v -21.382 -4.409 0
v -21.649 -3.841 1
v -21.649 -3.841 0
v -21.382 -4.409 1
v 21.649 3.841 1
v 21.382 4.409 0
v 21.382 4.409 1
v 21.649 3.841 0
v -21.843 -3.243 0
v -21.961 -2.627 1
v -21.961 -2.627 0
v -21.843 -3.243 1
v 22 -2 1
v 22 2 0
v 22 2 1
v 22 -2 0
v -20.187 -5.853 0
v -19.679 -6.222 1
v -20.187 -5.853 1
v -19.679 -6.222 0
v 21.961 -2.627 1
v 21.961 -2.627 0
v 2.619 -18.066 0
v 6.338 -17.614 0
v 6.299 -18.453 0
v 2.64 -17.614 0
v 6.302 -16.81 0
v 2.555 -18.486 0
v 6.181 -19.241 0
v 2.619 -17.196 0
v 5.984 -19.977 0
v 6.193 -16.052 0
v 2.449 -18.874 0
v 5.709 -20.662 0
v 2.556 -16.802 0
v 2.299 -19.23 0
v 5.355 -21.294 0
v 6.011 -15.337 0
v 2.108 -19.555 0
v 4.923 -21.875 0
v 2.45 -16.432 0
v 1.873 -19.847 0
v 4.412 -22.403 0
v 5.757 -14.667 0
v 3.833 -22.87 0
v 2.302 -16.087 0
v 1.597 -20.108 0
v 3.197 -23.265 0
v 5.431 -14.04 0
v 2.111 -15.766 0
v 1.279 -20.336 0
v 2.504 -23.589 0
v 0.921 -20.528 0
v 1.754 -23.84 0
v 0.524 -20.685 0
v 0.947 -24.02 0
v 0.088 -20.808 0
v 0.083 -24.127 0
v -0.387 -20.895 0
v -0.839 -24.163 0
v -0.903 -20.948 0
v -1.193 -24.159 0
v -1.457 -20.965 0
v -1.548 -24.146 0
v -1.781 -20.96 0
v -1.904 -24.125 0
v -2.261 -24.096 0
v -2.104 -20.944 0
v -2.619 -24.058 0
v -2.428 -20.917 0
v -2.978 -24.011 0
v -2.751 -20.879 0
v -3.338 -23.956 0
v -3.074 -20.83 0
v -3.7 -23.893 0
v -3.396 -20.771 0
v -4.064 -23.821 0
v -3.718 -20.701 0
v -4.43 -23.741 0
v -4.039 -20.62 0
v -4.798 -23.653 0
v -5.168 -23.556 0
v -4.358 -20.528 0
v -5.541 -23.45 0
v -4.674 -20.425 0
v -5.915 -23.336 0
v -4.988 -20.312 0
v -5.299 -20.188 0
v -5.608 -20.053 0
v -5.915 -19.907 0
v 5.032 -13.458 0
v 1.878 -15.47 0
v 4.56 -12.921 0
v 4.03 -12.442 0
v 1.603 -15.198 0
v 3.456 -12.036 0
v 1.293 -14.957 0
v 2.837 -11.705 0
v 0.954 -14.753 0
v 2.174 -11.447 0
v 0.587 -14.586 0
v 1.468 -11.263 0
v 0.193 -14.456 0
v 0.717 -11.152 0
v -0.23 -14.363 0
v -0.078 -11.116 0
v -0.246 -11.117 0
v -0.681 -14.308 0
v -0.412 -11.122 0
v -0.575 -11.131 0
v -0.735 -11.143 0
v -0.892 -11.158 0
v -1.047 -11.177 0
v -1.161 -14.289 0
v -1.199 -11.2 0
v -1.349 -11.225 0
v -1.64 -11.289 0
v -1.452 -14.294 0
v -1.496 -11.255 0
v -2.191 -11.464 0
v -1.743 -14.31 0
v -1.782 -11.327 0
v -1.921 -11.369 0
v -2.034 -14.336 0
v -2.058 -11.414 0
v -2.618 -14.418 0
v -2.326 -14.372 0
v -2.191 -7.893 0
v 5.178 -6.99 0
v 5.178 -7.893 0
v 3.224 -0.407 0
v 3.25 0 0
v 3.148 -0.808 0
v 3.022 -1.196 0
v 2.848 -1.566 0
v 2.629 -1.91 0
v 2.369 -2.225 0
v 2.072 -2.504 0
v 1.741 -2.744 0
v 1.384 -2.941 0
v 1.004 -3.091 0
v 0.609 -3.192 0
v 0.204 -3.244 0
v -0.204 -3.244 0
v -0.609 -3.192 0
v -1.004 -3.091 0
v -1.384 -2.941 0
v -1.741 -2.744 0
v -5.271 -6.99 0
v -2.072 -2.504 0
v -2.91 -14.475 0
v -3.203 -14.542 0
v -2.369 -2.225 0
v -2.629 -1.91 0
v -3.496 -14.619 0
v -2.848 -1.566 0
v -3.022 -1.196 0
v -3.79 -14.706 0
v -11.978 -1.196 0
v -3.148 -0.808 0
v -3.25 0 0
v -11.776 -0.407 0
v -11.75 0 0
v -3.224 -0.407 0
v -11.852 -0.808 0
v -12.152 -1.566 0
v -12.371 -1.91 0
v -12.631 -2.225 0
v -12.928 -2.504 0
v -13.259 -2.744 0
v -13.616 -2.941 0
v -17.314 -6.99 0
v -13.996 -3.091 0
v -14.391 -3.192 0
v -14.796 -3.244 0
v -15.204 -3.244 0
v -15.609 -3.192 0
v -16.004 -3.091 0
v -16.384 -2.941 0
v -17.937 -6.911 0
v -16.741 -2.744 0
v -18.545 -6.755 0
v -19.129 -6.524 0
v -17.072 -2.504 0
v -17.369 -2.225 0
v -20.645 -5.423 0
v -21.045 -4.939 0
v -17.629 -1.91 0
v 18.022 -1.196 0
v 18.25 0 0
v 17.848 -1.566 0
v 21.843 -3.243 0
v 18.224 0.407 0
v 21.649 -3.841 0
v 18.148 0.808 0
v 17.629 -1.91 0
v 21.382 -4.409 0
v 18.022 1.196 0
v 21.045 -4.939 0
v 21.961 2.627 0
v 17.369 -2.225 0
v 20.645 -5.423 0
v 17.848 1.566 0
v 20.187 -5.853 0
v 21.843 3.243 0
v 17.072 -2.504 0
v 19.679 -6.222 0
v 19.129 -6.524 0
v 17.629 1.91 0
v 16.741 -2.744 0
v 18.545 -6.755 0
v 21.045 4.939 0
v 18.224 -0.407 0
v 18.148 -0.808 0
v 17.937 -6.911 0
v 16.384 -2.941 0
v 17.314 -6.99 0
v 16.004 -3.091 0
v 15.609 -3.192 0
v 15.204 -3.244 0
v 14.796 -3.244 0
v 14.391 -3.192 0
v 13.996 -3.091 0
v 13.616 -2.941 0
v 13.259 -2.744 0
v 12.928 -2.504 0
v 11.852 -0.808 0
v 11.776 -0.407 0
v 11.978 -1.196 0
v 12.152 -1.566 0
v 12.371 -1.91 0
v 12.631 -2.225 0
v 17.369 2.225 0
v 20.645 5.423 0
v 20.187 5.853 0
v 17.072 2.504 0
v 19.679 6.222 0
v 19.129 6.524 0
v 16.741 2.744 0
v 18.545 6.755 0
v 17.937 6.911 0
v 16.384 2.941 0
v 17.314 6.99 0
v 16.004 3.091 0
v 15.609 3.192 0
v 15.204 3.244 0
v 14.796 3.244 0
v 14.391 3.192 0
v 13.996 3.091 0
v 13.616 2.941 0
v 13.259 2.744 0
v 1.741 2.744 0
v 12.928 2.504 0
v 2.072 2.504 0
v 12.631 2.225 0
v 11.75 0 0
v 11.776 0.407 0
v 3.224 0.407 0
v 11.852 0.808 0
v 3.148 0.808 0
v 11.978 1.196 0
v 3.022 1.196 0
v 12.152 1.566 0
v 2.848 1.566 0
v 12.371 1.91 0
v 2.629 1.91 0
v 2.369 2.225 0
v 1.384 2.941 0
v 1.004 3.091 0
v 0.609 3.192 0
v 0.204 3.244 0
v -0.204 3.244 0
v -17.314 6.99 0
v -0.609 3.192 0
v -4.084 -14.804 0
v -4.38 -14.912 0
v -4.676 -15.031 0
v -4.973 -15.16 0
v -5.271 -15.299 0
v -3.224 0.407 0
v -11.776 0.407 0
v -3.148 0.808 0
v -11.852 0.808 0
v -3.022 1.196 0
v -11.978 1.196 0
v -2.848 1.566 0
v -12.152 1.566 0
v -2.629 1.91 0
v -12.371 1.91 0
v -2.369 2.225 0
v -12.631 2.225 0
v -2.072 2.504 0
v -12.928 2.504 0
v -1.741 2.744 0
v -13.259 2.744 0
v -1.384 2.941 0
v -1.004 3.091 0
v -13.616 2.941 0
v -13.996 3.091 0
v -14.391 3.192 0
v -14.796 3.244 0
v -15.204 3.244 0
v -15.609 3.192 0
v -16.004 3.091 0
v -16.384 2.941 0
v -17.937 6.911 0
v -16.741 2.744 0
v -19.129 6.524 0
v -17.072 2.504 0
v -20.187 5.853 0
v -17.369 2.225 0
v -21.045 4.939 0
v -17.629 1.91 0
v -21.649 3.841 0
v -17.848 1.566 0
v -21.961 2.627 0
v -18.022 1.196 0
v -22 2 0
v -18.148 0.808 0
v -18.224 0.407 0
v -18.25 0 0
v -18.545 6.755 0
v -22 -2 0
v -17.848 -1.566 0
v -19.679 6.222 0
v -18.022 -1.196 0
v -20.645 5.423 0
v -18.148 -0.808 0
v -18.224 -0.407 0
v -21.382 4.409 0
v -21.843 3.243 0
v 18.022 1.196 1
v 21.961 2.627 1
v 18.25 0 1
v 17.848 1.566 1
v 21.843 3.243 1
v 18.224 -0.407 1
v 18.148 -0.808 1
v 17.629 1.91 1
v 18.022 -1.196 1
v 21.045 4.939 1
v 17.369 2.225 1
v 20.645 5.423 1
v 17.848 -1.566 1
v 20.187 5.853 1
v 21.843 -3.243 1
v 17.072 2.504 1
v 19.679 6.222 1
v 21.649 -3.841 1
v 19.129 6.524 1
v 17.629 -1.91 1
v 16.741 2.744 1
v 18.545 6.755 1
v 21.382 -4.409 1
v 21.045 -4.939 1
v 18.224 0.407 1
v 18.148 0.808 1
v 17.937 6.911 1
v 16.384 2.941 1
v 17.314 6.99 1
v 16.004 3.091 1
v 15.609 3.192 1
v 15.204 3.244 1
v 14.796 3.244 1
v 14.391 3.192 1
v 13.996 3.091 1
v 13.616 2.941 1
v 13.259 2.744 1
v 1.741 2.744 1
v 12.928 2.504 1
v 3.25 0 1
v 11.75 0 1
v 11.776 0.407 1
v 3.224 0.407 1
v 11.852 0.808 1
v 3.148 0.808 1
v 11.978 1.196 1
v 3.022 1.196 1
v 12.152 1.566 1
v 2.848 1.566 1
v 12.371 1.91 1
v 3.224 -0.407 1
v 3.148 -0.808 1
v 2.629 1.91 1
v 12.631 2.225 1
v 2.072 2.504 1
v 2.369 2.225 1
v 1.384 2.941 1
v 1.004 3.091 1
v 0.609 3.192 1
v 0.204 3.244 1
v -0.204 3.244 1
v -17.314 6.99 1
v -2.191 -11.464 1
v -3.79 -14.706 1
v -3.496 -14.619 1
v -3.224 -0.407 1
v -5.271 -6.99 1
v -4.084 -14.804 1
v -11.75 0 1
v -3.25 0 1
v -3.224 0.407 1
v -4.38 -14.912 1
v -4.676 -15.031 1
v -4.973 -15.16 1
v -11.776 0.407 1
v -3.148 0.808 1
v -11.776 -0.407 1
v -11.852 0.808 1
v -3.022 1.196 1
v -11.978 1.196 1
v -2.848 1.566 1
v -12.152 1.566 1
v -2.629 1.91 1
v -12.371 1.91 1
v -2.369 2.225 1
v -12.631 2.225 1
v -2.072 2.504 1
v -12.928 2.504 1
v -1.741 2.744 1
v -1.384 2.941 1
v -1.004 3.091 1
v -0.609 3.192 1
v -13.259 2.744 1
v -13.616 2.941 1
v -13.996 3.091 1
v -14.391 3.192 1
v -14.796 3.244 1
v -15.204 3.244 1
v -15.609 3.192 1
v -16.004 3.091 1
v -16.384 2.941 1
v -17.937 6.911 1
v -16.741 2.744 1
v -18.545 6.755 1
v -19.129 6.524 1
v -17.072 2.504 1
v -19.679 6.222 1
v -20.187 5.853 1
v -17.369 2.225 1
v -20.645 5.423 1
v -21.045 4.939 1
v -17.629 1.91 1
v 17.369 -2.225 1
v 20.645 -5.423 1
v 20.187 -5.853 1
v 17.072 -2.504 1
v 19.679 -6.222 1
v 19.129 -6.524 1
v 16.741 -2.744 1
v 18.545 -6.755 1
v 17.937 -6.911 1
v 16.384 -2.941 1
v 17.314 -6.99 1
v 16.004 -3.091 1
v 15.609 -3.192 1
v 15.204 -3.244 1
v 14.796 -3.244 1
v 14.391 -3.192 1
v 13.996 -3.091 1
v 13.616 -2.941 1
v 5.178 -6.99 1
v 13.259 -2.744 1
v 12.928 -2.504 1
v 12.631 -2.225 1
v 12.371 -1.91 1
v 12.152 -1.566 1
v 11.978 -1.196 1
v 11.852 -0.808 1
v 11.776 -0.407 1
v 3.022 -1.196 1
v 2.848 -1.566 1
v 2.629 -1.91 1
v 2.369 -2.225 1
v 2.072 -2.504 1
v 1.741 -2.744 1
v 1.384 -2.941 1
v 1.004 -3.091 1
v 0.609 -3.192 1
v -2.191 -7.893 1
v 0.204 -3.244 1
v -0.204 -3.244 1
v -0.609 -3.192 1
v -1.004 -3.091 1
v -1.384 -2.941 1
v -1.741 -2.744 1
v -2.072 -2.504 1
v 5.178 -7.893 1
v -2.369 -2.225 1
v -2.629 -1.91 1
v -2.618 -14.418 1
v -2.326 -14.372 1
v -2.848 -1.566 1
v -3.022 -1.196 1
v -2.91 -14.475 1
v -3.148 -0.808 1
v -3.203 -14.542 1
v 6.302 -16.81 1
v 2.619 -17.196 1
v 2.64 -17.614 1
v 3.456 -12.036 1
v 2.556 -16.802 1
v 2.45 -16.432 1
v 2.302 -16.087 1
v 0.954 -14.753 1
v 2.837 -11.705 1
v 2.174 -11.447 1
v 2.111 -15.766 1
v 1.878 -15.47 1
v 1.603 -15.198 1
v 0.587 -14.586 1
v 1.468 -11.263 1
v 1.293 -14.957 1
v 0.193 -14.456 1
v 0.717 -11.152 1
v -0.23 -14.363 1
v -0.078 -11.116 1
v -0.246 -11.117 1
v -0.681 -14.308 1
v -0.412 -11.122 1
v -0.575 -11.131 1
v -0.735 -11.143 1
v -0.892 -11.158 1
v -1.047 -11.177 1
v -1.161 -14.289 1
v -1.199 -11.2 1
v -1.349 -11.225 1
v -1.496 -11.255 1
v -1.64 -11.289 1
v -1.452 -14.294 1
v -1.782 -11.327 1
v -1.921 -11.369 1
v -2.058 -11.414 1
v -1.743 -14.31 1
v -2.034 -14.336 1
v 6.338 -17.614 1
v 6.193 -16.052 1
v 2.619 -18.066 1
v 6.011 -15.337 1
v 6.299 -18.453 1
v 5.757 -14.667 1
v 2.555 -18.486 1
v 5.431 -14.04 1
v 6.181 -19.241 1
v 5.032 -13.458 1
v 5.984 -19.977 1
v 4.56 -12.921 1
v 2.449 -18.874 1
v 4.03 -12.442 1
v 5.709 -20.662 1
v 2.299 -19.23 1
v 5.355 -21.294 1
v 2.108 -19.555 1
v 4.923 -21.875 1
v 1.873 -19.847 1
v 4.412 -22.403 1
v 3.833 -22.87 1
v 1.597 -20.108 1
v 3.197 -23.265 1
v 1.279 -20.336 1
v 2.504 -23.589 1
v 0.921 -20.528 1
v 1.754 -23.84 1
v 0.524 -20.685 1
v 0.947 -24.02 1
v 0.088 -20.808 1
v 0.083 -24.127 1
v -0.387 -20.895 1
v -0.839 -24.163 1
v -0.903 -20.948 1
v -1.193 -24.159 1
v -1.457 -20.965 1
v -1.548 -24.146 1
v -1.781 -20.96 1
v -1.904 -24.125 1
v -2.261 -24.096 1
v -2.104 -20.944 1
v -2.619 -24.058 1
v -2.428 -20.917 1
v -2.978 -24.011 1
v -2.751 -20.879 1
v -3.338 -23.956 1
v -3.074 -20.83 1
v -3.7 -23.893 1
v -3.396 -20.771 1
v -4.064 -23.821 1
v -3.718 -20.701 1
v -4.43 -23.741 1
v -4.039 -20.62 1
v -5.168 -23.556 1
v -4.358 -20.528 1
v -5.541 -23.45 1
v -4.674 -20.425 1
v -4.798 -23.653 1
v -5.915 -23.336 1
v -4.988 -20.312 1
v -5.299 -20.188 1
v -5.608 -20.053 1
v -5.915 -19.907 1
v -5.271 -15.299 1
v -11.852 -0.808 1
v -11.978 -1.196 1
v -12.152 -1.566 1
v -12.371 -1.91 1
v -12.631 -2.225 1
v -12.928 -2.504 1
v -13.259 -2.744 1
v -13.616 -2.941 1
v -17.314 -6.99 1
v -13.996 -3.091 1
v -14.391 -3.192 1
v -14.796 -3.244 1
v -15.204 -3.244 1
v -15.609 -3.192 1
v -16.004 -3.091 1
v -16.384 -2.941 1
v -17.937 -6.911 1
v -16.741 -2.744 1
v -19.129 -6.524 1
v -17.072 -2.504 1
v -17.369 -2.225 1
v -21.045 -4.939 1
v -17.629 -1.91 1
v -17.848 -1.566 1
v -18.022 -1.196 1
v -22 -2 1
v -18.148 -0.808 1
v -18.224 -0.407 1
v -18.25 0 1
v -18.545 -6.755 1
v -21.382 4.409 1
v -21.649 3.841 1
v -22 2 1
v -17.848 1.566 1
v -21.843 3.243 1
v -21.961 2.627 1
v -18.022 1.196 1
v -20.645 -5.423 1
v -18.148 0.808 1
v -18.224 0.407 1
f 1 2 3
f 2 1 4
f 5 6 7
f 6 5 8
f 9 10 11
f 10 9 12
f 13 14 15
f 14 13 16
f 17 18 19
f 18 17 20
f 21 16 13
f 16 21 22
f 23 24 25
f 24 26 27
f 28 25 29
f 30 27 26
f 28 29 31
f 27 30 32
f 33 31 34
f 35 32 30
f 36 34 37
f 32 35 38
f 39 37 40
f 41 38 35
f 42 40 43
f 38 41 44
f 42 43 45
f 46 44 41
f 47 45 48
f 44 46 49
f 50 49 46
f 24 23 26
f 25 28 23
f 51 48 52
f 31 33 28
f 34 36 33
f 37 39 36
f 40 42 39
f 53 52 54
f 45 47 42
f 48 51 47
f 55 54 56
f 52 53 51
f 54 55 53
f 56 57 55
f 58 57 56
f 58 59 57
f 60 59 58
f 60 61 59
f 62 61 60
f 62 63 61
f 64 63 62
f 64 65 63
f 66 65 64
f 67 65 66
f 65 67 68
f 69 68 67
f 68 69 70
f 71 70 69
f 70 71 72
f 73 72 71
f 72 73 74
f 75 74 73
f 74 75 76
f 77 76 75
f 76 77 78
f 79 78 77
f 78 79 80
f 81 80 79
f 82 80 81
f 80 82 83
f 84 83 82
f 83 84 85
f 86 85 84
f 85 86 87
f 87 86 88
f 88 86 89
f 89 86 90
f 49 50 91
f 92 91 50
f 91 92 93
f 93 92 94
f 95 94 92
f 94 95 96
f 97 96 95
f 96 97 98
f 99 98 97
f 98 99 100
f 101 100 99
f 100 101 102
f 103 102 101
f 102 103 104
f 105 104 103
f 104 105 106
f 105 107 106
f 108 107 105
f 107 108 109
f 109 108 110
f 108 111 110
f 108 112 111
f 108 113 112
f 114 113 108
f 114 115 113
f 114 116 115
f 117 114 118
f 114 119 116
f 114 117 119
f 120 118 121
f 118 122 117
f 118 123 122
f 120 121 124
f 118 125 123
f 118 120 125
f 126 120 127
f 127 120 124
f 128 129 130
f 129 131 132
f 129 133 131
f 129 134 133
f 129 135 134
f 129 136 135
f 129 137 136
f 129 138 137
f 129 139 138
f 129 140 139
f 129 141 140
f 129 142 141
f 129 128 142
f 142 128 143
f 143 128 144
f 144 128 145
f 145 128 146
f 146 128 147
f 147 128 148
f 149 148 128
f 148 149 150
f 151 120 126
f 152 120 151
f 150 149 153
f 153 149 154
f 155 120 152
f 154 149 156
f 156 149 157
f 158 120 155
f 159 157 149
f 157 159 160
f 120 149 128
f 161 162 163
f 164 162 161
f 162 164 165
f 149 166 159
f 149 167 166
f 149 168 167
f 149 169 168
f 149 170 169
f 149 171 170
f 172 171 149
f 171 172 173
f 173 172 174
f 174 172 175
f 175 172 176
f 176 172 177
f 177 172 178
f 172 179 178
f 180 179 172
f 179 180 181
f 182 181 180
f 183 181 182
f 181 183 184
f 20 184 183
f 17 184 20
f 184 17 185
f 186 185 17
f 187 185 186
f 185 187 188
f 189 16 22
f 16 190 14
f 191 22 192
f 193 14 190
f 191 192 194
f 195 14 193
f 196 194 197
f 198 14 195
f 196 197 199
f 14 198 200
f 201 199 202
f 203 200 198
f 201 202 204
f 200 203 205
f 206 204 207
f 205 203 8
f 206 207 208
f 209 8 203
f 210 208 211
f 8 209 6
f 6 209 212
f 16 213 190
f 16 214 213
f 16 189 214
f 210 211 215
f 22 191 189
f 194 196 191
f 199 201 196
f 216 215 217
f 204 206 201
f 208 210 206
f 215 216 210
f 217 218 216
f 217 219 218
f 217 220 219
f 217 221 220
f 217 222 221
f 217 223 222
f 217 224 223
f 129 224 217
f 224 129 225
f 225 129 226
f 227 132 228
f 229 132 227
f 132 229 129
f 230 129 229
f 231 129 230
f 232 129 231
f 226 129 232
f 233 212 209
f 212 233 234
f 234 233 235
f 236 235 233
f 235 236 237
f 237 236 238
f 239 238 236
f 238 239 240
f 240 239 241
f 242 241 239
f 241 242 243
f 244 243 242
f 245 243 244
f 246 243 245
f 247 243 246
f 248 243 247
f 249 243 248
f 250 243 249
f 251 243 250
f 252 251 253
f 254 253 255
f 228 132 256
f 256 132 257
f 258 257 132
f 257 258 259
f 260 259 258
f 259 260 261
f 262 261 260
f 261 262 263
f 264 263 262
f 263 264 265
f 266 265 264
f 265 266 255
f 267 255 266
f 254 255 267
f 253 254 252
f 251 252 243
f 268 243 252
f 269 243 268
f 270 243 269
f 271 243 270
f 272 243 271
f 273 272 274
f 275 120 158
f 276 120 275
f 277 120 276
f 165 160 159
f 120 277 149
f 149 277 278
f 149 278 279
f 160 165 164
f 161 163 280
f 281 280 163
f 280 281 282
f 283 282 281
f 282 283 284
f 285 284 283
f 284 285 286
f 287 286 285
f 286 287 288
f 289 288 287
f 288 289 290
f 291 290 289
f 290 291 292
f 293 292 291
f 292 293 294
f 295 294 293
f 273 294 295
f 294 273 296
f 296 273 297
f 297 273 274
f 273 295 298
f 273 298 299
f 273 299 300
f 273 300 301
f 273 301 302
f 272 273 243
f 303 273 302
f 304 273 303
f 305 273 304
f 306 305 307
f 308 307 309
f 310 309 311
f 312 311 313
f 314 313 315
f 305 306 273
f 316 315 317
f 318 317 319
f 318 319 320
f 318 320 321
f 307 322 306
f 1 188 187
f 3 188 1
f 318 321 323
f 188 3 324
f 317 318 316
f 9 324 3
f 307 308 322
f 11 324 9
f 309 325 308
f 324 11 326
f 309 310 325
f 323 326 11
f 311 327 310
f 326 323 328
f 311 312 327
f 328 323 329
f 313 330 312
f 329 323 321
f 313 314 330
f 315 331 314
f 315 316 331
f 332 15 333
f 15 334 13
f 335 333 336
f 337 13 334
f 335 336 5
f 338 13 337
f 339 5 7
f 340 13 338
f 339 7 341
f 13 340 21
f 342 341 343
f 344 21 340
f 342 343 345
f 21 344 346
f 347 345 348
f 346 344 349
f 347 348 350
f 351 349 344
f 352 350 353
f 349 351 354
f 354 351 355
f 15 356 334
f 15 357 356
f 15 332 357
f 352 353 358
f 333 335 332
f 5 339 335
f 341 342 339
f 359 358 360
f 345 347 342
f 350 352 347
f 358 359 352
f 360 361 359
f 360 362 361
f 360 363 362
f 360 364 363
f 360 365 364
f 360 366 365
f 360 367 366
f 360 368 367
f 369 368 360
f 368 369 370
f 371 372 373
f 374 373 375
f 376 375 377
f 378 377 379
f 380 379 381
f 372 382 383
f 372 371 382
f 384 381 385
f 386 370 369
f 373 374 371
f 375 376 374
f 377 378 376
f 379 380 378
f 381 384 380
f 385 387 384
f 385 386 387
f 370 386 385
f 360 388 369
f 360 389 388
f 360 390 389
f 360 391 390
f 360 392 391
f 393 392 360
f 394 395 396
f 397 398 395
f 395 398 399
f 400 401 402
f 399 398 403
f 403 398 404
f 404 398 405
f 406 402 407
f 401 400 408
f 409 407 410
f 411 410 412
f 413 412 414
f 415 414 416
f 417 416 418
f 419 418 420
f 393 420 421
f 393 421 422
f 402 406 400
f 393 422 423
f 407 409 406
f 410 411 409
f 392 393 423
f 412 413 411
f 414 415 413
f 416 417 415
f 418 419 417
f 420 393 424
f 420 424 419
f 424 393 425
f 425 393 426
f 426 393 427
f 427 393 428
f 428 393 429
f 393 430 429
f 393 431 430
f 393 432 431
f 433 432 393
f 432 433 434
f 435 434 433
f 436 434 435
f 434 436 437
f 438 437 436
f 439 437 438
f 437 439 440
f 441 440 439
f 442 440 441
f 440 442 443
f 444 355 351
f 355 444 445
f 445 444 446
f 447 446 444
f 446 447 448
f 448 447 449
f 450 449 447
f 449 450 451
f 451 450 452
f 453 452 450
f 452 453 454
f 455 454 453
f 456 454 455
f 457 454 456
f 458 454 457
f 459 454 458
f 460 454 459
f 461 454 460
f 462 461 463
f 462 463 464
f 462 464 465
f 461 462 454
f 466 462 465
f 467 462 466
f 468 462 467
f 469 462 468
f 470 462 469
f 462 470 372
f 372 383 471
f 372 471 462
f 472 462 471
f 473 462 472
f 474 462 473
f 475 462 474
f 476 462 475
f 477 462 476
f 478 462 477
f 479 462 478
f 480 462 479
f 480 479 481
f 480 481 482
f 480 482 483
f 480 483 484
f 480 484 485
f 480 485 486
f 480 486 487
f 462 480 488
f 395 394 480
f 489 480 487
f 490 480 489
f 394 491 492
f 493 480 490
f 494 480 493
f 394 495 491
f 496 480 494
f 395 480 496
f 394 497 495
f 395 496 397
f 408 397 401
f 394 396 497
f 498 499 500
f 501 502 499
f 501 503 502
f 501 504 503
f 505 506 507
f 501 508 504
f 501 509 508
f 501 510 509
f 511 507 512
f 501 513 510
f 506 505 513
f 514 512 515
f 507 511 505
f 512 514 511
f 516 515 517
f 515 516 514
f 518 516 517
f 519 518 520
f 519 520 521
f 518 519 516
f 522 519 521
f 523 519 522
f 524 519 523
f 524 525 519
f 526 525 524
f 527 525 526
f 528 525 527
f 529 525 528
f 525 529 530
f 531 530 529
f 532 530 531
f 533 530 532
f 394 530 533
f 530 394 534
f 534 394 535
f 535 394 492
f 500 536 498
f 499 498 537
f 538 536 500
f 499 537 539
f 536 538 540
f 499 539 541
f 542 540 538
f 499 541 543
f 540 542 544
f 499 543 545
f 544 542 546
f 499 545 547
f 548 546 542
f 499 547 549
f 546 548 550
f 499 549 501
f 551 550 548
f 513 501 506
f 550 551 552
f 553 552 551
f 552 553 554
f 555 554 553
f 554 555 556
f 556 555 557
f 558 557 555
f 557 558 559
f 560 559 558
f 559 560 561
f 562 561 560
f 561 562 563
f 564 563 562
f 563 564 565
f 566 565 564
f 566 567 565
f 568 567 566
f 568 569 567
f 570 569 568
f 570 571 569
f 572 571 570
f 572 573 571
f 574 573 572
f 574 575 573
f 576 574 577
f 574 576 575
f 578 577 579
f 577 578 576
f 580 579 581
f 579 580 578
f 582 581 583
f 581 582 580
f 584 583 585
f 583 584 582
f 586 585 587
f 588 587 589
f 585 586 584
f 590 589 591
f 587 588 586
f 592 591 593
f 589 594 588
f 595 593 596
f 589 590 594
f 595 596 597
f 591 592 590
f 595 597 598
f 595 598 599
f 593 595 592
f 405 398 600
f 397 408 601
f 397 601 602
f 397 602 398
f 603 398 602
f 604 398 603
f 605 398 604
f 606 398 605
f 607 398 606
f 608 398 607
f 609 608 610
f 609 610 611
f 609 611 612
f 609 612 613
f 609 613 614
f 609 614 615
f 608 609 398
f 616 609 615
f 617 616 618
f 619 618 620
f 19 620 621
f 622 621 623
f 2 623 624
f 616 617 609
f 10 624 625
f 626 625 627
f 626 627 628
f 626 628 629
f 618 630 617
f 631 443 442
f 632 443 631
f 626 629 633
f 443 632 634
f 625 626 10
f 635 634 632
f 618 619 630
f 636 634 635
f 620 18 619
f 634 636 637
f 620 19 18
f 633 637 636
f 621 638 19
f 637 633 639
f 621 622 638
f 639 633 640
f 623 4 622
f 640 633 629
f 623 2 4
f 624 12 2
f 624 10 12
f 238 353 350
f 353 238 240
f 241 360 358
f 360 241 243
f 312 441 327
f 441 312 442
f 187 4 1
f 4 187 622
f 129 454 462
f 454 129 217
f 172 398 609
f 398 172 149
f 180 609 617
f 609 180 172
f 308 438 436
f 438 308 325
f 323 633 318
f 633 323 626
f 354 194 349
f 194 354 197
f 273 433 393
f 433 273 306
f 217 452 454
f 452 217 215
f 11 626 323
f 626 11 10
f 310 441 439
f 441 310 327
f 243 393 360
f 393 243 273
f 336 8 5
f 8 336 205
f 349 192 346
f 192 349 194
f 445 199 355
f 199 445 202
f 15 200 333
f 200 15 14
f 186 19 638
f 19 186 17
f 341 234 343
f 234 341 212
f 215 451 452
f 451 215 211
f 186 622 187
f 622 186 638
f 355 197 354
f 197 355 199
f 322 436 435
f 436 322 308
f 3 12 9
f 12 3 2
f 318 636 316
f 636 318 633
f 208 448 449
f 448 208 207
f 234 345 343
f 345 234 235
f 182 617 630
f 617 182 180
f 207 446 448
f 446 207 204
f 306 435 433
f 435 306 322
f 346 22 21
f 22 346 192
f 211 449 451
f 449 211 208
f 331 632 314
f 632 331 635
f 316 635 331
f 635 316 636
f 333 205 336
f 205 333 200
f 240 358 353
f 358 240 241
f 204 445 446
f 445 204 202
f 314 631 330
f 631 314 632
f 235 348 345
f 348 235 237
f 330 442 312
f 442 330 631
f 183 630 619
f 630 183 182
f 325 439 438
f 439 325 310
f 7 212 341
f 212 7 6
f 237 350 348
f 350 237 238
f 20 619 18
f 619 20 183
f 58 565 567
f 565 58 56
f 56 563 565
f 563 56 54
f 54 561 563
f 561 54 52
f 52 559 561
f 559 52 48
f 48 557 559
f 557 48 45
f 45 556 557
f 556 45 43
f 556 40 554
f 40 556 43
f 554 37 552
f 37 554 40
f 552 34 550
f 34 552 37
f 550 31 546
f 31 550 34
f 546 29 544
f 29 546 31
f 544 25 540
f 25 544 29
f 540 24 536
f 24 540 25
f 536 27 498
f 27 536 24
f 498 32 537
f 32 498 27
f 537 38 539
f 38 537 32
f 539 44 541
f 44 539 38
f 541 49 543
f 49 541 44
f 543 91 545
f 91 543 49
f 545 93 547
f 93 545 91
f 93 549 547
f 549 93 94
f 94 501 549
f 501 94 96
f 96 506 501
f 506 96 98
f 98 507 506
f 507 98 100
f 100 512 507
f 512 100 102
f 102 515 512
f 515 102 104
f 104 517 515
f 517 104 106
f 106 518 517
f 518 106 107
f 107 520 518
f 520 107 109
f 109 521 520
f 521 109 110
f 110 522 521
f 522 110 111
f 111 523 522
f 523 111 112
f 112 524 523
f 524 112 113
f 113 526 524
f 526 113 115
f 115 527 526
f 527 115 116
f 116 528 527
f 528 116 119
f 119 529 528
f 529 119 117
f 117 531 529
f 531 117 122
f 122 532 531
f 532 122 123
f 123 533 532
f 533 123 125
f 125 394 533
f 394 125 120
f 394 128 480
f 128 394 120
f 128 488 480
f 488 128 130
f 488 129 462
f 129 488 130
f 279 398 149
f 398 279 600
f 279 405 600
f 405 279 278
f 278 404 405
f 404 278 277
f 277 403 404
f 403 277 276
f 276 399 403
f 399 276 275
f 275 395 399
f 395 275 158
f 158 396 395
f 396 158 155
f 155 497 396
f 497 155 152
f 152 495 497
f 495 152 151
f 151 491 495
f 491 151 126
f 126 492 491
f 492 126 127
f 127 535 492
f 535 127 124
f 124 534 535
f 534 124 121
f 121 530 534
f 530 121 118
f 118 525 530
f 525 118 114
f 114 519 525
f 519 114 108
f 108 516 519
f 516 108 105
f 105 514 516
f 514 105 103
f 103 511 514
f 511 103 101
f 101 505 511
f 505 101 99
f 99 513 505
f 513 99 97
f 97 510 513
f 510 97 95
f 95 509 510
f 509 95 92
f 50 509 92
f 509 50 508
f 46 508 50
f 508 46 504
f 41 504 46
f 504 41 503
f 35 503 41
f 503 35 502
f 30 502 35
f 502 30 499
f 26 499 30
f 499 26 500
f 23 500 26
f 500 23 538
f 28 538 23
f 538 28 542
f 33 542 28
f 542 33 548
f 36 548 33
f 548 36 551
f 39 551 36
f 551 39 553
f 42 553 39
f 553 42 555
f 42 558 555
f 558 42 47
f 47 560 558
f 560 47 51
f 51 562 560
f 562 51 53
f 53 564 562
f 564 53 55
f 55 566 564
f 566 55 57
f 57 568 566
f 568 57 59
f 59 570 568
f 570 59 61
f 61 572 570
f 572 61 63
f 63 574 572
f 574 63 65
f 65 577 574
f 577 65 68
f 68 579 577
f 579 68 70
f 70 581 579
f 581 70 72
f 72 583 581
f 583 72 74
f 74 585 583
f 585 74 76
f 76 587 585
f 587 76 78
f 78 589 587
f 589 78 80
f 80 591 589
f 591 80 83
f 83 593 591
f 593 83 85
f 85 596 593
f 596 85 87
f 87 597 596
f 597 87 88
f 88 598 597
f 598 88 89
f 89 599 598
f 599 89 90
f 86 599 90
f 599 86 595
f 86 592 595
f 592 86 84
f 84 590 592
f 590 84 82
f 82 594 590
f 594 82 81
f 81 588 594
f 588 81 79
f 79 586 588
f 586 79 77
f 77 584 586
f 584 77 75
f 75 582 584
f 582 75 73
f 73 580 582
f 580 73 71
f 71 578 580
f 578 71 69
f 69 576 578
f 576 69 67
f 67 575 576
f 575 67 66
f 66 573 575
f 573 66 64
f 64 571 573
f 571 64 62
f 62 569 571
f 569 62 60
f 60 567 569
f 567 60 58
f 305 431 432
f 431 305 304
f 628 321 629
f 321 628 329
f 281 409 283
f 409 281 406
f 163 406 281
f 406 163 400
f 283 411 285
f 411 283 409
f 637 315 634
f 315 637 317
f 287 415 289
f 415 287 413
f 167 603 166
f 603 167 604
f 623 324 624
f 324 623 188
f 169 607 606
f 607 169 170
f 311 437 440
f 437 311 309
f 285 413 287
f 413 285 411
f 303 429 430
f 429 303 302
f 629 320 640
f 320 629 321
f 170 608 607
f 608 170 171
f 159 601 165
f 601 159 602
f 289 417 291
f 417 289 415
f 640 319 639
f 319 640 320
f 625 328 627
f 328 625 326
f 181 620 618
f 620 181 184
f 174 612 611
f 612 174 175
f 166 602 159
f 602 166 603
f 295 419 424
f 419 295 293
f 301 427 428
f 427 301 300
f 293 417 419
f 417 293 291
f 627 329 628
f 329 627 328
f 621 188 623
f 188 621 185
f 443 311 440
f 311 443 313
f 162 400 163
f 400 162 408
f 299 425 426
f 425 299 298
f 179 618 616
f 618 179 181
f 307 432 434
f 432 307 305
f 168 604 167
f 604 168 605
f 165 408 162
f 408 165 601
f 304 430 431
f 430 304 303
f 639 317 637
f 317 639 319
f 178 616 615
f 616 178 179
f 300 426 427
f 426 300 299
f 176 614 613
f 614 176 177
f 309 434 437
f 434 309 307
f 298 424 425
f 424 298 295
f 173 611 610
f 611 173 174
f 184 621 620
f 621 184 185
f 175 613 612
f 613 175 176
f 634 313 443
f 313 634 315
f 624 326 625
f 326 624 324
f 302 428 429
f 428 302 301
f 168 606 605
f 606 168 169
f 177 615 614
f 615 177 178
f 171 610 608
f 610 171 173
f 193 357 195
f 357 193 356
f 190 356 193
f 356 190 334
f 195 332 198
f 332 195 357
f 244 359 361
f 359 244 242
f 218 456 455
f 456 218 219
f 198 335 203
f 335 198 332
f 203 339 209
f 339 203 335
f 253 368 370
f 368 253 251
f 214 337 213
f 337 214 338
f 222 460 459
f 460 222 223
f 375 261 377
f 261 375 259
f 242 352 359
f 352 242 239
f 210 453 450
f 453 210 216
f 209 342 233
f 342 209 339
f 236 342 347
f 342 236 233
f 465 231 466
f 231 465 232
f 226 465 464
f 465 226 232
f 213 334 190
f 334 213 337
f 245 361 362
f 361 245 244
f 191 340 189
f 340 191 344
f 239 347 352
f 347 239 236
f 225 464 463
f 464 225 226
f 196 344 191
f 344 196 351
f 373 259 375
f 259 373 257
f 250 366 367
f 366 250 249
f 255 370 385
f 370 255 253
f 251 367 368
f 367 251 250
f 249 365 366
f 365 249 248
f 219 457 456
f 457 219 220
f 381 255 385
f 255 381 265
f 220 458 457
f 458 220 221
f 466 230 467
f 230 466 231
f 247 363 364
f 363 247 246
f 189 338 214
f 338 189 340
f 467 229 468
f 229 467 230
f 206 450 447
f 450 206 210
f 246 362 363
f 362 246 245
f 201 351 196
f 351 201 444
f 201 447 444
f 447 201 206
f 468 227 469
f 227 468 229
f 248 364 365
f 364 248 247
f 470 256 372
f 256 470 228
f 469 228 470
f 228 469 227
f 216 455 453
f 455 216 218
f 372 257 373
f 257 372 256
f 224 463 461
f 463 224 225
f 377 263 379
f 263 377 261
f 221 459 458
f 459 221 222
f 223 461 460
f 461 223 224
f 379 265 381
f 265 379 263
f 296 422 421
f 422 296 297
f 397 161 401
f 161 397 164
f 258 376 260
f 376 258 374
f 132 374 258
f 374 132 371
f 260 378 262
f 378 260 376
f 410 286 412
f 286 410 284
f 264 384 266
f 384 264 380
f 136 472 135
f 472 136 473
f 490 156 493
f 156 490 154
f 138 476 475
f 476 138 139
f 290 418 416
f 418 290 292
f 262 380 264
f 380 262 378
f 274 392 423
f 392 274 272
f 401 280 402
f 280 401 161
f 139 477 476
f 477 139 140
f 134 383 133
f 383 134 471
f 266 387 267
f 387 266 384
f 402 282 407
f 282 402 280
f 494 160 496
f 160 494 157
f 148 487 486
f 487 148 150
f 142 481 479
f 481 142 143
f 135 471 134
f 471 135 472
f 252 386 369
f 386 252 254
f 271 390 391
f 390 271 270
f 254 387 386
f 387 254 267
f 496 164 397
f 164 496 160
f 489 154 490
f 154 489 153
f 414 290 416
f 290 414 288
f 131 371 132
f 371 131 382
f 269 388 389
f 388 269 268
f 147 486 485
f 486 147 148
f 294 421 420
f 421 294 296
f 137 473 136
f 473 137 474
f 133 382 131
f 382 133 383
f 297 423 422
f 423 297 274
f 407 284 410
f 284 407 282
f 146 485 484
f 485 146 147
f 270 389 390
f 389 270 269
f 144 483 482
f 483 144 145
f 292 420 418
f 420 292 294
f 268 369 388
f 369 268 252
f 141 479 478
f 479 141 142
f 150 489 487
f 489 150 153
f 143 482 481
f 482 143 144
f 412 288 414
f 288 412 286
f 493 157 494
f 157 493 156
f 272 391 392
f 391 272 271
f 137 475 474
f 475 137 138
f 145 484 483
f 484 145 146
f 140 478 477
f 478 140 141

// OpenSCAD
$fn = 50;


difference() {
	union() {
		translate(v = [0, 0, 0]) {
			rotate(a = [0, 0, 0]) {
				hull() {
					translate(v = [-17.0000000000, 2.0000000000, 0]) {
						rotate(a = [0, 0, 0]) {
							translate(v = [0, 0, 0]) {
								rotate(a = [0, 0, 0]) {
									cylinder(h = 1, r = 5);
								}
							}
						}
					}
					translate(v = [17.0000000000, 2.0000000000, 0]) {
						rotate(a = [0, 0, 0]) {
							translate(v = [0, 0, 0]) {
								rotate(a = [0, 0, 0]) {
									cylinder(h = 1, r = 5);
								}
							}
						}
					}
					translate(v = [-17.0000000000, -2.0000000000, 0]) {
						rotate(a = [0, 0, 0]) {
							translate(v = [0, 0, 0]) {
								rotate(a = [0, 0, 0]) {
									cylinder(h = 1, r = 5);
								}
							}
						}
					}
					translate(v = [17.0000000000, -2.0000000000, 0]) {
						rotate(a = [0, 0, 0]) {
							translate(v = [0, 0, 0]) {
								rotate(a = [0, 0, 0]) {
									cylinder(h = 1, r = 5);
								}
							}
						}
					}
				}
			}
		}
		translate(v = [0, -5, 0]) {
			rotate(a = [0, 0, 0]) {
				linear_extrude(height = 1) {
					text(font = "DejaVu Sans Mono:style=Bold", halign = "center", size = 19.0000000000, text = "5", valign = "top");
				}
			}
		}
	}
	union() {
		translate(v = [-15.0000000000, 0.0000000000, -125.0000000000]) {
			rotate(a = [0, 0, 0]) {
				cylinder(h = 250, r = 3.2500000000);
			}
		}
		translate(v = [15.0000000000, 0.0000000000, -125.0000000000]) {
			rotate(a = [0, 0, 0]) {
				cylinder(h = 250, r = 3.2500000000);
			}
		}
		translate(v = [15.0000000000, 0.0000000000, -125.0000000000]) {
			rotate(a = [0, 0, 0]) {
				cylinder(h = 250, r = 3.2500000000);
			}
		}
		translate(v = [0, 0, -125.0000000000]) {
			rotate(a = [0, 0, 0]) {
				cylinder(h = 250, r = 3.2500000000);
			}
		}
	}
}
